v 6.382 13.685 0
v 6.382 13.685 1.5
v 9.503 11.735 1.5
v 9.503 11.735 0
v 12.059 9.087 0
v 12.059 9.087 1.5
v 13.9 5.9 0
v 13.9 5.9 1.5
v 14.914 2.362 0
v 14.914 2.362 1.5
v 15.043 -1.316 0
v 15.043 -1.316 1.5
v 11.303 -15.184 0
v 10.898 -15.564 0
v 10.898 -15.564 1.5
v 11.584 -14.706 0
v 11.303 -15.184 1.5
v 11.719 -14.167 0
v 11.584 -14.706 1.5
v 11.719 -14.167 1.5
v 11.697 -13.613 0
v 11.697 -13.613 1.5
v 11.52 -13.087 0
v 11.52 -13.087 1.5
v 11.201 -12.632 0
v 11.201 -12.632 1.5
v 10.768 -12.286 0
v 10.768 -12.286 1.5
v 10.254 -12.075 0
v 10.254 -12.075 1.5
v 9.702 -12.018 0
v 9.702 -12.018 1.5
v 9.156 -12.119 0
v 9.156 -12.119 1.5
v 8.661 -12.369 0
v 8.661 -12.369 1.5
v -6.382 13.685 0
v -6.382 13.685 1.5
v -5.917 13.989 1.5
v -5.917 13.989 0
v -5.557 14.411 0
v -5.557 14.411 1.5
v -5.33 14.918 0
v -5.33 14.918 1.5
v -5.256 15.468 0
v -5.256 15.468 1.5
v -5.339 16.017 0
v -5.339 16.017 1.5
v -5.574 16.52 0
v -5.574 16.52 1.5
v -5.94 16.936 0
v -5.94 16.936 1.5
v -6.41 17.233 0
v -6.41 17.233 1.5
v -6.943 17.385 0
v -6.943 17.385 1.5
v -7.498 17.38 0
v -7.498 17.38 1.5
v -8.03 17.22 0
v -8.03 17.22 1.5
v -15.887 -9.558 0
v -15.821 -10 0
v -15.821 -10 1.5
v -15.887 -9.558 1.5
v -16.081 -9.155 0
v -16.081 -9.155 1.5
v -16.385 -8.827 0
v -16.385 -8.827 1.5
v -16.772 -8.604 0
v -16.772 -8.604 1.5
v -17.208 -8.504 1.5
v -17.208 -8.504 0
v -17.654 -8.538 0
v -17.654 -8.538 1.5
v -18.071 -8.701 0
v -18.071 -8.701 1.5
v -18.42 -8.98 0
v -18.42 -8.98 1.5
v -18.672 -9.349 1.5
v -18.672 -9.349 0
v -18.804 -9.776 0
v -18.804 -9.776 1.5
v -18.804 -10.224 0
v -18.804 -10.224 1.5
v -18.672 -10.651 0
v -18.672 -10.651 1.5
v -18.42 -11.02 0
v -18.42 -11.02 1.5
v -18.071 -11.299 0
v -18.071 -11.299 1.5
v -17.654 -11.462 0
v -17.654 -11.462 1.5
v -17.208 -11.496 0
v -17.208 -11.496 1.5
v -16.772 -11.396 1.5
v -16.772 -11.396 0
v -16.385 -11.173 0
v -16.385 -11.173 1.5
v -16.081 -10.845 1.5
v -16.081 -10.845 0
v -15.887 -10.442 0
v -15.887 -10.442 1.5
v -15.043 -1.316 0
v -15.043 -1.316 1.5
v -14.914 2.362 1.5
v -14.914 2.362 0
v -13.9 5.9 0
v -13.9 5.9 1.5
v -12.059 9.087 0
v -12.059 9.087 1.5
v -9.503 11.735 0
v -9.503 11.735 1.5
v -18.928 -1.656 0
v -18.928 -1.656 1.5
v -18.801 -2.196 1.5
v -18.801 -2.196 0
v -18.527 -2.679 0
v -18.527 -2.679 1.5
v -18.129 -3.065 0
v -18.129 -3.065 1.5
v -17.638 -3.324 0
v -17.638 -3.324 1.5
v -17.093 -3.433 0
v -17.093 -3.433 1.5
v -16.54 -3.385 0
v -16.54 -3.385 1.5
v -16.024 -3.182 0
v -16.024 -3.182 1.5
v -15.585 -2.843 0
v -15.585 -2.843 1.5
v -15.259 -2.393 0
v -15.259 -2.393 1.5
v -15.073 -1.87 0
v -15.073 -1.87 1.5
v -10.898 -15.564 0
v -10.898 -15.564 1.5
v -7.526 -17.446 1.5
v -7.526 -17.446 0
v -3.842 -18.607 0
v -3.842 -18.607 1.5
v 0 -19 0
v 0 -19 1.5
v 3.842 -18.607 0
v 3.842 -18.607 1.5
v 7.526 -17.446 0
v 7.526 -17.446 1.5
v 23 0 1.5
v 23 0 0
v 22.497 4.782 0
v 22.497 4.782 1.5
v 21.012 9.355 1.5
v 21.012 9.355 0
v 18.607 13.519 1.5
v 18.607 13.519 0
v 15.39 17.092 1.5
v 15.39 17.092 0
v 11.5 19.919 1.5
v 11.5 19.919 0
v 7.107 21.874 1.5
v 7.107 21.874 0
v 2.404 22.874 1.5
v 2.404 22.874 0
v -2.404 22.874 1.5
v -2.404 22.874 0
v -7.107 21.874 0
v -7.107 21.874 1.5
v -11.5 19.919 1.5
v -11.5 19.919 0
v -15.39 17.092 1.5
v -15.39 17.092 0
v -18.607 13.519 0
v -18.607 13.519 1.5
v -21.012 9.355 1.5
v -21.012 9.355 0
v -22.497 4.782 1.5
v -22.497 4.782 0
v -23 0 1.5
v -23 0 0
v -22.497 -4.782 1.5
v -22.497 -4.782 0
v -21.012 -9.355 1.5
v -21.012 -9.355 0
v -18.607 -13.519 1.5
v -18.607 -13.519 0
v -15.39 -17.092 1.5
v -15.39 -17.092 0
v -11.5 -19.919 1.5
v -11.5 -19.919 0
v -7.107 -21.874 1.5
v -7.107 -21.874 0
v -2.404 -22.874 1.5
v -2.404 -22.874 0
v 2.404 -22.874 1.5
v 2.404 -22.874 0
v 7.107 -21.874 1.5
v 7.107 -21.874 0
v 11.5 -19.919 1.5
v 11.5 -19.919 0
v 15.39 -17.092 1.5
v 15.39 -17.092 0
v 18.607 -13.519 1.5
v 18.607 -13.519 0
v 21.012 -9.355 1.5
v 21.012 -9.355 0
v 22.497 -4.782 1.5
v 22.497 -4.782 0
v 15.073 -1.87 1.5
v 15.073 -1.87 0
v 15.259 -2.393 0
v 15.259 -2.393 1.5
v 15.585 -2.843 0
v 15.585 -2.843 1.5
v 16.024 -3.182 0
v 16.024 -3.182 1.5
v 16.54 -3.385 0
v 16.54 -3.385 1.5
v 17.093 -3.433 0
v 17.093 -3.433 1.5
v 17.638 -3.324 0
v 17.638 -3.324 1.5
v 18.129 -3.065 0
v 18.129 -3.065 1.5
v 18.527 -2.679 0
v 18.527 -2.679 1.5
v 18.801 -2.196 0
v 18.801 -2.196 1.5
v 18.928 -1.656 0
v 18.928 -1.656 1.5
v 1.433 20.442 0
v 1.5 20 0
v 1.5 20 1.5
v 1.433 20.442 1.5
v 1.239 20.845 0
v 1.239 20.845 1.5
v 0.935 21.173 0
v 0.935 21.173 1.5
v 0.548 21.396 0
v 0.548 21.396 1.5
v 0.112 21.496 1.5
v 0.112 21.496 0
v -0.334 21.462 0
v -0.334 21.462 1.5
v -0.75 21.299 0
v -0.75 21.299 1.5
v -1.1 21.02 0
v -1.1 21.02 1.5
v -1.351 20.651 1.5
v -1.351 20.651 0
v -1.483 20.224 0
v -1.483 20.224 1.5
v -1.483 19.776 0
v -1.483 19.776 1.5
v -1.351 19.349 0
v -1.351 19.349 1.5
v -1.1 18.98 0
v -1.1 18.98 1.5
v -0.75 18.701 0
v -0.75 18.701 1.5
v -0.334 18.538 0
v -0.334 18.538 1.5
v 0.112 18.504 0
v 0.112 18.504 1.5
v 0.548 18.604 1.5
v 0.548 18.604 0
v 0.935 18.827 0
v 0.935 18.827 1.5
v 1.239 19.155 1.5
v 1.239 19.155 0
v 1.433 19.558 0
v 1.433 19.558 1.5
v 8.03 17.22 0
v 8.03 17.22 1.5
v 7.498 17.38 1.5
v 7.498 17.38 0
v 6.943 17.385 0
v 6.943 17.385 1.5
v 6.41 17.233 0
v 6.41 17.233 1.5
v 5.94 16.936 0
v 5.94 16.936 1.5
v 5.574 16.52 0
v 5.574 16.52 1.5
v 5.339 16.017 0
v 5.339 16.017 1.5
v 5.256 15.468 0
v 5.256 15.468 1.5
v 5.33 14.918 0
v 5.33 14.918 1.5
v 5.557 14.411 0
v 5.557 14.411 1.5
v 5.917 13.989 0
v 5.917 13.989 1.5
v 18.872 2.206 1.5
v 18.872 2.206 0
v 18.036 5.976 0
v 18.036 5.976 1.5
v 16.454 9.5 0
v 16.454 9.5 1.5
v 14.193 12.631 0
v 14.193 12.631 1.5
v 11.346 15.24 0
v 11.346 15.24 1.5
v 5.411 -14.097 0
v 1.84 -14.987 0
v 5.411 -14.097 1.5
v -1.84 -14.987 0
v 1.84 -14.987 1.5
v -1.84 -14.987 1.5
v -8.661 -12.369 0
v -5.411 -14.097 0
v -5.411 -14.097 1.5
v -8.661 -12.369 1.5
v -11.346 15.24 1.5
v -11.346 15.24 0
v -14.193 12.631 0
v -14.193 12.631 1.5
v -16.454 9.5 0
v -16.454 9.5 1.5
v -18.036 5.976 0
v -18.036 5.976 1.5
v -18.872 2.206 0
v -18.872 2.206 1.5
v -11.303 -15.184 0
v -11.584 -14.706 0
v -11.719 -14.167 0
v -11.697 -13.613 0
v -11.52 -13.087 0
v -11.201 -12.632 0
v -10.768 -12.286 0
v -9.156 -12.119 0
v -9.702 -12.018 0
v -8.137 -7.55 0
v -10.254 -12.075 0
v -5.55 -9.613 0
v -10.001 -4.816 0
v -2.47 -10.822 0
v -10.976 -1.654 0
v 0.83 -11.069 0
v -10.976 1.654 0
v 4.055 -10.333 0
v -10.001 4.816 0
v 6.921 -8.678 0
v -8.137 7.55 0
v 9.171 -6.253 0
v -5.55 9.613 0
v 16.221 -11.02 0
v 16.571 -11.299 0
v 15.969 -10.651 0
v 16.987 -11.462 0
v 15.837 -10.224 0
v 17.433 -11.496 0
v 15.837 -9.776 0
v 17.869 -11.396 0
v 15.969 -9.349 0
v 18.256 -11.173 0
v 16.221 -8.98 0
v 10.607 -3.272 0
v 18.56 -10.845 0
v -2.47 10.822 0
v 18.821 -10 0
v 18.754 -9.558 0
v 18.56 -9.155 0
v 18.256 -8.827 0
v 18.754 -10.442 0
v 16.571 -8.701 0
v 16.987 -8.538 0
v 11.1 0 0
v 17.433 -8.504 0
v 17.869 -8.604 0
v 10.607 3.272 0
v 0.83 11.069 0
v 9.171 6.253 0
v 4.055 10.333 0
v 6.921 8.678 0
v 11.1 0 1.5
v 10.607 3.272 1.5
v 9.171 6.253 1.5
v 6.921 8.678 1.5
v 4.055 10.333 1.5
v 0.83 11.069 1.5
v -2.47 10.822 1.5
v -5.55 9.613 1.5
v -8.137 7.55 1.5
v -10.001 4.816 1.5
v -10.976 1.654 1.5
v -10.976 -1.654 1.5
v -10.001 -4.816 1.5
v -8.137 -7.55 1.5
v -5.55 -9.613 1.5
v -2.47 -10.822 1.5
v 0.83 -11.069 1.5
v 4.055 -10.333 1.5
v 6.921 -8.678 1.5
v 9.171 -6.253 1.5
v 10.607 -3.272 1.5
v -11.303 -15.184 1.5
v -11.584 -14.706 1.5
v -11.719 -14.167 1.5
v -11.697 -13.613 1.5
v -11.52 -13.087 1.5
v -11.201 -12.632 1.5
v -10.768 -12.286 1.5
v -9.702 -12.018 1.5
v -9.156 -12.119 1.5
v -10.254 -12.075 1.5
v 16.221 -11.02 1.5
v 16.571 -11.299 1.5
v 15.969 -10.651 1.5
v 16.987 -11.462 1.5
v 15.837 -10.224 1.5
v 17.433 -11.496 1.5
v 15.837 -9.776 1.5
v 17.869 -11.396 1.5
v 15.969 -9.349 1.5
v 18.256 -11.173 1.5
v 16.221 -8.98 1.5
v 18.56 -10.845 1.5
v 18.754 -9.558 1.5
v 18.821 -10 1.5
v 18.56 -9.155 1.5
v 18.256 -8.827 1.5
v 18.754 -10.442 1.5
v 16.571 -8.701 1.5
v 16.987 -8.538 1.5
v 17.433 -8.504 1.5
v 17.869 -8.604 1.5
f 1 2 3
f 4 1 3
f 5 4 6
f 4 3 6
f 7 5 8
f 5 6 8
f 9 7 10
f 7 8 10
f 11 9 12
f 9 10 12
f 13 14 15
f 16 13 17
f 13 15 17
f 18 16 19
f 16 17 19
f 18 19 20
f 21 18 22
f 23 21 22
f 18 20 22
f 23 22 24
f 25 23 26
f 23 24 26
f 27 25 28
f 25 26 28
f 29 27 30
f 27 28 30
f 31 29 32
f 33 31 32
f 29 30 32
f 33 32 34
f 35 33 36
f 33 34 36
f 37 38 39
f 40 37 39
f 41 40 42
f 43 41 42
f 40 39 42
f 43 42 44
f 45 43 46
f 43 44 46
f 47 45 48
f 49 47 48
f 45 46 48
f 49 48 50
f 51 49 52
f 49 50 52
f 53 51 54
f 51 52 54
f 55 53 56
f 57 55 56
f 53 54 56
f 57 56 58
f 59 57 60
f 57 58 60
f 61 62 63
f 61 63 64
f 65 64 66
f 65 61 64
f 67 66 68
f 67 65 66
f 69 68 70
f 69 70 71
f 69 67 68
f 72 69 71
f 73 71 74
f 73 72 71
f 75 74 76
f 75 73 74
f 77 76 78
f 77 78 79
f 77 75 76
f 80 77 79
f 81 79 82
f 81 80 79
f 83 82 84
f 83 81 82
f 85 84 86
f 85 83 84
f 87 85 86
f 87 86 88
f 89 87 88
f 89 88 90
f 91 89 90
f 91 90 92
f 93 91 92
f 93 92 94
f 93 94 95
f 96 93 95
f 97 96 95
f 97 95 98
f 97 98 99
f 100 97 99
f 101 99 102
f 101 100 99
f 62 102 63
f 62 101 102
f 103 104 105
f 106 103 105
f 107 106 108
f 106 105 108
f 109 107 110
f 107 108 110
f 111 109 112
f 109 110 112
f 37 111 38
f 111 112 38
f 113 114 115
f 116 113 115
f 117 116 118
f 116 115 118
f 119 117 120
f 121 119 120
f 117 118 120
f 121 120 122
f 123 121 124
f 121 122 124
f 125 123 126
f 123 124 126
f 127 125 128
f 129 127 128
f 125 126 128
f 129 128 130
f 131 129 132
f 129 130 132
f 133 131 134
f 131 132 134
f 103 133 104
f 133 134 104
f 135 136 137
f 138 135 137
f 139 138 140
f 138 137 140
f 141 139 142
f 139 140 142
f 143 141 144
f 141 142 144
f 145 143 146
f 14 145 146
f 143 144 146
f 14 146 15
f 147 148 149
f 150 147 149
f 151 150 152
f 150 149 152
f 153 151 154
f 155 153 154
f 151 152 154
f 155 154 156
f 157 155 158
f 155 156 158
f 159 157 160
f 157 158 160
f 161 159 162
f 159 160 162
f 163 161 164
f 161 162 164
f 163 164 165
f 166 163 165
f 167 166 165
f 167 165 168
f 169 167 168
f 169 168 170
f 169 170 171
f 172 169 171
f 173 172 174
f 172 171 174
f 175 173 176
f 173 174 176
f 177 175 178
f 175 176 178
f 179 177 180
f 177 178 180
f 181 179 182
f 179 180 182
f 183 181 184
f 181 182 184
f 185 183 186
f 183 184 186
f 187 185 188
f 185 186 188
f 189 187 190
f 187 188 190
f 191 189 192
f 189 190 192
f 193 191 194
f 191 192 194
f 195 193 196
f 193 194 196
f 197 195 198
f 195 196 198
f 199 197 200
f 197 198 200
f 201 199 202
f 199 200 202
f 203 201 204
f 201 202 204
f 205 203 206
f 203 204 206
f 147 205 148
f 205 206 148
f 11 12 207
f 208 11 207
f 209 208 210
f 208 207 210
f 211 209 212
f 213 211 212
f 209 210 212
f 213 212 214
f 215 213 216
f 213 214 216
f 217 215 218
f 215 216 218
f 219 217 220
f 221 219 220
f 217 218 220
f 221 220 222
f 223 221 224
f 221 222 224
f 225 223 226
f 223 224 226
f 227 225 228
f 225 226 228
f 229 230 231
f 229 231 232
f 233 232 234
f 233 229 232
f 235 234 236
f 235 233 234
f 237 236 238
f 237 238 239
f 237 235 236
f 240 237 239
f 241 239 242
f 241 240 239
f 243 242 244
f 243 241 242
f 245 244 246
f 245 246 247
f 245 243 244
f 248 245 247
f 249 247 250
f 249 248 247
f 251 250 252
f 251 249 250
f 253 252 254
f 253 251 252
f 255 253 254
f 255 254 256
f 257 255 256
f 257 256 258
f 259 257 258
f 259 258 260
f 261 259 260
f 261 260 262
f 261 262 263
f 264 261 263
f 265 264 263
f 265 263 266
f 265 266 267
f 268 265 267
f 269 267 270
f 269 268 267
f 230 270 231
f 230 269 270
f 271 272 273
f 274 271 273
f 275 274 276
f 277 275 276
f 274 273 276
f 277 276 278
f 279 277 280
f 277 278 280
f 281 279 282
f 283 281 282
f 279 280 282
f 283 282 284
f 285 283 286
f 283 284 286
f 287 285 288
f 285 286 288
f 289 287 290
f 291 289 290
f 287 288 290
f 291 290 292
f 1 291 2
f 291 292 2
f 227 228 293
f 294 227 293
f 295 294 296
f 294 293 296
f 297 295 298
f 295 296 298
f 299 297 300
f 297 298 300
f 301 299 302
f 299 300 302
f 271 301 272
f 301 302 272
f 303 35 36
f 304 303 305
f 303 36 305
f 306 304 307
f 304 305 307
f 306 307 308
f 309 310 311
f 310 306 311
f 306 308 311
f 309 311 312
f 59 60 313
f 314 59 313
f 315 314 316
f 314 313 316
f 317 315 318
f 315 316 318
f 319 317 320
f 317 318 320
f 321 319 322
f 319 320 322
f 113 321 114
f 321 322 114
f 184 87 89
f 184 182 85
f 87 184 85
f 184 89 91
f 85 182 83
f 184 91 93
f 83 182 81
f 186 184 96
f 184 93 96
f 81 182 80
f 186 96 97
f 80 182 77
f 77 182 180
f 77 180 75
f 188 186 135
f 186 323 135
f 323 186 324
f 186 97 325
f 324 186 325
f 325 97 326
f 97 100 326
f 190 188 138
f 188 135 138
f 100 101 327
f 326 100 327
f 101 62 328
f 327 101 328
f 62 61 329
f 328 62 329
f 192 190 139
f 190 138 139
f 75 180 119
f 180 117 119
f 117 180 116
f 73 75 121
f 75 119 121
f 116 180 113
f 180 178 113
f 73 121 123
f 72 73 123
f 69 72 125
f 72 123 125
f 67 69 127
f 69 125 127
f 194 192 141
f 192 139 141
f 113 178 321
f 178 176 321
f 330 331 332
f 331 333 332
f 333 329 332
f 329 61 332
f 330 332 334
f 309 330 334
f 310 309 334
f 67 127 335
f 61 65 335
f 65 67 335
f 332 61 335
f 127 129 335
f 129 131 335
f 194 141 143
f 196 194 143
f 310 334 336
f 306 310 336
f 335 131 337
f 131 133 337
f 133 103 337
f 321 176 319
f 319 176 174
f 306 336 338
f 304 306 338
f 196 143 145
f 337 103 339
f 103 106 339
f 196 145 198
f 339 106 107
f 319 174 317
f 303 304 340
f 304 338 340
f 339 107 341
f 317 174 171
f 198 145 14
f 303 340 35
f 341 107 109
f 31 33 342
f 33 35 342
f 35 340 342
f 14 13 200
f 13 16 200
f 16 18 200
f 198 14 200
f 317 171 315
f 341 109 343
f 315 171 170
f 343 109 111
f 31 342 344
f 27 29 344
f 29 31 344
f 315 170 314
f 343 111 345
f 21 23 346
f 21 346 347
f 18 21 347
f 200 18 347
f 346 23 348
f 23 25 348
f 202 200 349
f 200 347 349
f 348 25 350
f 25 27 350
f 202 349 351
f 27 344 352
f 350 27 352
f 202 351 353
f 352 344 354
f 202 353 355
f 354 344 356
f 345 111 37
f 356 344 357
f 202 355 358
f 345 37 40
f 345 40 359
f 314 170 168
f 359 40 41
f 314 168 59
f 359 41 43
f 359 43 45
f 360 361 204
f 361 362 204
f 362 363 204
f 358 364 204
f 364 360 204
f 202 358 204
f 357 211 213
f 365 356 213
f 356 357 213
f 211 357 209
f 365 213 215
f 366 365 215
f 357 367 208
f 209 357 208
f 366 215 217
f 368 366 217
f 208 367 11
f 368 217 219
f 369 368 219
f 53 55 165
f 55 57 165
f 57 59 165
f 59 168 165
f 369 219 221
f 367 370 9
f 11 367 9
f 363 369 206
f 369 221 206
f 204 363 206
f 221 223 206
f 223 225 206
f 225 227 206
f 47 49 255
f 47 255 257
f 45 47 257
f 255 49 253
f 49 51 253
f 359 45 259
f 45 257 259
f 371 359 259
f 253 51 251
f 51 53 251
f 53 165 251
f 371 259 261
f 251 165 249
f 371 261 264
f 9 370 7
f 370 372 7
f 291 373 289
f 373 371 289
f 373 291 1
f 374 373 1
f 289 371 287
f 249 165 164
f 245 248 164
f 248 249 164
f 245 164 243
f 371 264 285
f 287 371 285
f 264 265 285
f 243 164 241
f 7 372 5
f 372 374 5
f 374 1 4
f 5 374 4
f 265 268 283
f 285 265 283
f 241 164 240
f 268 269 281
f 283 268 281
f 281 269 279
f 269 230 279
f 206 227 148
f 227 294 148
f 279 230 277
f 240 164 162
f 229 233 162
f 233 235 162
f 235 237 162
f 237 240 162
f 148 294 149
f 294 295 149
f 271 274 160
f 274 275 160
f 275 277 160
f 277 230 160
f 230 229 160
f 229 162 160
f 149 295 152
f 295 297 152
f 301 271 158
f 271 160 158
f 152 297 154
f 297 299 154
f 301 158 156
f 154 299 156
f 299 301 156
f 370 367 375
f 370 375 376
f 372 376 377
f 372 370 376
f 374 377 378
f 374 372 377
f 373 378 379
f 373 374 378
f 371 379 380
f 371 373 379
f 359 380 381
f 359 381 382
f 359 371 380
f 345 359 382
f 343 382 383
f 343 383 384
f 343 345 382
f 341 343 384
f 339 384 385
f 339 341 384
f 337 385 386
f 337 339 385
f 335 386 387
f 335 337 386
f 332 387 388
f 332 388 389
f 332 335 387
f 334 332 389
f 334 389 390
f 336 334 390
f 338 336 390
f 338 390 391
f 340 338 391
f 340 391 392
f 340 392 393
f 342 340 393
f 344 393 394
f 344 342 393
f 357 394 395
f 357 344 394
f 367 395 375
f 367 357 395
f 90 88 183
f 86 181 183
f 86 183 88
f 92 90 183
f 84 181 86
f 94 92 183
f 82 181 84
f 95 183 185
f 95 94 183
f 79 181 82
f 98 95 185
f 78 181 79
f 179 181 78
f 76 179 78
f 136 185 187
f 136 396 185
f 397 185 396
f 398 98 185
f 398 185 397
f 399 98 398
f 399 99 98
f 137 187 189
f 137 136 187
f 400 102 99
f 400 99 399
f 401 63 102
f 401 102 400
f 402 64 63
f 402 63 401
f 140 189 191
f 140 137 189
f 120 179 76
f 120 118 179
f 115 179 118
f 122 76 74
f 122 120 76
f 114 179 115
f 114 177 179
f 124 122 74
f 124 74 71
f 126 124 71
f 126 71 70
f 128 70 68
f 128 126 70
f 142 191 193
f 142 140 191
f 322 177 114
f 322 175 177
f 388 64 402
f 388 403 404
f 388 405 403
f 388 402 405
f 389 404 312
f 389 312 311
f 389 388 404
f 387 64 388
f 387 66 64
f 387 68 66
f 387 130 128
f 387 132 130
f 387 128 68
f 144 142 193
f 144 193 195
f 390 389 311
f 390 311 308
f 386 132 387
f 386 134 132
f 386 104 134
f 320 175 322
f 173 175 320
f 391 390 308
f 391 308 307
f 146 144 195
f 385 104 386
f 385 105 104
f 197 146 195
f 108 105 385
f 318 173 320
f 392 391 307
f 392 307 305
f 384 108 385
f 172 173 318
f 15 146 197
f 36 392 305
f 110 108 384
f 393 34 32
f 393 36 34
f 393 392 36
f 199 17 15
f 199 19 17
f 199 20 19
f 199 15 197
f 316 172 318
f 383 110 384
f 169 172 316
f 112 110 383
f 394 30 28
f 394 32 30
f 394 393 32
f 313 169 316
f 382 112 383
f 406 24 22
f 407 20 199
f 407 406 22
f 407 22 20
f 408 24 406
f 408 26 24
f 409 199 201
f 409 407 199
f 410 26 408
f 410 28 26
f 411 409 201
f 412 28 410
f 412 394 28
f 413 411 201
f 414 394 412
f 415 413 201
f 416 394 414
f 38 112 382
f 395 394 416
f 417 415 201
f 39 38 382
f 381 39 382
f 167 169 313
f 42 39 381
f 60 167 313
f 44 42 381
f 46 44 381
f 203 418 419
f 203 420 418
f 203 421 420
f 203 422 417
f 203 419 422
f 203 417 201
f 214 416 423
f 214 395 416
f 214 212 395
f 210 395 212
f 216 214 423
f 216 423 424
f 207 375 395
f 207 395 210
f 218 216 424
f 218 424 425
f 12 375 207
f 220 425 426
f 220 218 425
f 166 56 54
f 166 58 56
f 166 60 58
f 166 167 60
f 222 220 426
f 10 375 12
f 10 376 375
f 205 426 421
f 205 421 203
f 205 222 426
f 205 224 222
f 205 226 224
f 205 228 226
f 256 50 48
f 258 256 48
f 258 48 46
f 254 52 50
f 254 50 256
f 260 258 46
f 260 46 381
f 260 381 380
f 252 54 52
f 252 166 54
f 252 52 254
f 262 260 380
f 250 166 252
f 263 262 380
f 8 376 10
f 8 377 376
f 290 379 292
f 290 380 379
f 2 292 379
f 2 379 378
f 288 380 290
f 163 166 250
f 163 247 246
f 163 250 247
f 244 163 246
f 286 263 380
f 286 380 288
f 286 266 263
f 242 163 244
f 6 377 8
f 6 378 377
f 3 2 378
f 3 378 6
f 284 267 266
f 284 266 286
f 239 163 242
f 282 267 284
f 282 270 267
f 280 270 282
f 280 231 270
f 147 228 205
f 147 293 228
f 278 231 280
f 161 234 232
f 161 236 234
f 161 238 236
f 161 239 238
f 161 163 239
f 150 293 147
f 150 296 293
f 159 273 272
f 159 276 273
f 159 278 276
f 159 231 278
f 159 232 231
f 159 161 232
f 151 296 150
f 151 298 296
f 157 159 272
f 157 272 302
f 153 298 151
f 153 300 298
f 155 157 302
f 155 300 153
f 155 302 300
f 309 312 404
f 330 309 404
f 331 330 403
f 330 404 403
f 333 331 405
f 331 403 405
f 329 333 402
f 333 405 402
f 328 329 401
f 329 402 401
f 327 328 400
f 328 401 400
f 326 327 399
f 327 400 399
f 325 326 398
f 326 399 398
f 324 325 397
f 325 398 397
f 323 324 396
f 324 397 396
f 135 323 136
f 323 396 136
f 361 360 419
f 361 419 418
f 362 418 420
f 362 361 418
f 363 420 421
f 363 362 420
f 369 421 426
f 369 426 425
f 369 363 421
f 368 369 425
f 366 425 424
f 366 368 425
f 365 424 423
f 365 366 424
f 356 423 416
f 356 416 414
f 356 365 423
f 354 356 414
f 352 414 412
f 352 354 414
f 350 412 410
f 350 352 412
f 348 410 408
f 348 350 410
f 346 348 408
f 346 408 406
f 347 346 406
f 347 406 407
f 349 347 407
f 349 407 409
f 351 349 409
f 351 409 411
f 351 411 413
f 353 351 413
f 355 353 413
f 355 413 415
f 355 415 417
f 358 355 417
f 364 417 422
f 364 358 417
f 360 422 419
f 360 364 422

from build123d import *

# Parameters (mm, degrees)
SKETCH_1_R          = 23
SKETCH_1_R_2        = 1.5
SKETCH_1_R_3        = 11.1
EXTRUDE_1_DEPTH     = 1.5
CUT_EXTRUDE_1_DEPTH = 33.56148031


with BuildPart() as part:
    # 草图1 → 凸台-拉伸1 (new body)
    with BuildSketch(Plane.XY):
        Circle(SKETCH_1_R)
        with Locations((0, 20)):
            Circle(SKETCH_1_R_2, mode=Mode.SUBTRACT)
        Circle(SKETCH_1_R_3, mode=Mode.SUBTRACT)
        with Locations((17.320508076, -10)):
            Circle(SKETCH_1_R_2, mode=Mode.SUBTRACT)
        with Locations((-17.320508076, -10)):
            Circle(SKETCH_1_R_2, mode=Mode.SUBTRACT)
    extrude(amount=EXTRUDE_1_DEPTH)

    # 草图2 → 切除-拉伸1 (cut, through all)
    with BuildSketch(Plane.XY.offset(1.5)):
        with BuildLine():
            ThreePointArc((-8.029746973, 17.219847954), (-16.454482672, 9.5), (-18.927699264, -1.655959112))
            ThreePointArc((-18.927699264, -1.655959112), (-16.815165904, -3.428585075), (-15.042539941, -1.316051715))
            ThreePointArc((-15.042539941, -1.316051715), (-13.076983597, 7.55), (-6.381535752, 13.685247584))
            ThreePointArc((-6.381535752, 13.685247584), (-5.438341178, 16.276653379), (-8.029746973, 17.219847954))
        make_face()
        with BuildLine():
            ThreePointArc((18.927699264, -1.655959112), (16.454482672, 9.5), (8.029746973, 17.219847954))
            ThreePointArc((8.029746973, 17.219847954), (5.438341178, 16.276653379), (6.381535752, 13.685247584))
            ThreePointArc((6.381535752, 13.685247584), (13.076983597, 7.55), (15.042539941, -1.316051715))
            ThreePointArc((15.042539941, -1.316051715), (16.815165904, -3.428585075), (18.927699264, -1.655959112))
        make_face()
        with BuildLine():
            ThreePointArc((-10.897952291, -15.563888841), (0, -19), (10.897952291, -15.563888841))
            ThreePointArc((10.897952291, -15.563888841), (11.376824726, -12.848068304), (8.661004189, -12.369195869))
            ThreePointArc((8.661004189, -12.369195869), (0, -15.1), (-8.661004189, -12.369195869))
            ThreePointArc((-8.661004189, -12.369195869), (-11.376824726, -12.848068304), (-10.897952291, -15.563888841))
        make_face()
    extrude(amount=-CUT_EXTRUDE_1_DEPTH, mode=Mode.SUBTRACT)


solid = part.part
